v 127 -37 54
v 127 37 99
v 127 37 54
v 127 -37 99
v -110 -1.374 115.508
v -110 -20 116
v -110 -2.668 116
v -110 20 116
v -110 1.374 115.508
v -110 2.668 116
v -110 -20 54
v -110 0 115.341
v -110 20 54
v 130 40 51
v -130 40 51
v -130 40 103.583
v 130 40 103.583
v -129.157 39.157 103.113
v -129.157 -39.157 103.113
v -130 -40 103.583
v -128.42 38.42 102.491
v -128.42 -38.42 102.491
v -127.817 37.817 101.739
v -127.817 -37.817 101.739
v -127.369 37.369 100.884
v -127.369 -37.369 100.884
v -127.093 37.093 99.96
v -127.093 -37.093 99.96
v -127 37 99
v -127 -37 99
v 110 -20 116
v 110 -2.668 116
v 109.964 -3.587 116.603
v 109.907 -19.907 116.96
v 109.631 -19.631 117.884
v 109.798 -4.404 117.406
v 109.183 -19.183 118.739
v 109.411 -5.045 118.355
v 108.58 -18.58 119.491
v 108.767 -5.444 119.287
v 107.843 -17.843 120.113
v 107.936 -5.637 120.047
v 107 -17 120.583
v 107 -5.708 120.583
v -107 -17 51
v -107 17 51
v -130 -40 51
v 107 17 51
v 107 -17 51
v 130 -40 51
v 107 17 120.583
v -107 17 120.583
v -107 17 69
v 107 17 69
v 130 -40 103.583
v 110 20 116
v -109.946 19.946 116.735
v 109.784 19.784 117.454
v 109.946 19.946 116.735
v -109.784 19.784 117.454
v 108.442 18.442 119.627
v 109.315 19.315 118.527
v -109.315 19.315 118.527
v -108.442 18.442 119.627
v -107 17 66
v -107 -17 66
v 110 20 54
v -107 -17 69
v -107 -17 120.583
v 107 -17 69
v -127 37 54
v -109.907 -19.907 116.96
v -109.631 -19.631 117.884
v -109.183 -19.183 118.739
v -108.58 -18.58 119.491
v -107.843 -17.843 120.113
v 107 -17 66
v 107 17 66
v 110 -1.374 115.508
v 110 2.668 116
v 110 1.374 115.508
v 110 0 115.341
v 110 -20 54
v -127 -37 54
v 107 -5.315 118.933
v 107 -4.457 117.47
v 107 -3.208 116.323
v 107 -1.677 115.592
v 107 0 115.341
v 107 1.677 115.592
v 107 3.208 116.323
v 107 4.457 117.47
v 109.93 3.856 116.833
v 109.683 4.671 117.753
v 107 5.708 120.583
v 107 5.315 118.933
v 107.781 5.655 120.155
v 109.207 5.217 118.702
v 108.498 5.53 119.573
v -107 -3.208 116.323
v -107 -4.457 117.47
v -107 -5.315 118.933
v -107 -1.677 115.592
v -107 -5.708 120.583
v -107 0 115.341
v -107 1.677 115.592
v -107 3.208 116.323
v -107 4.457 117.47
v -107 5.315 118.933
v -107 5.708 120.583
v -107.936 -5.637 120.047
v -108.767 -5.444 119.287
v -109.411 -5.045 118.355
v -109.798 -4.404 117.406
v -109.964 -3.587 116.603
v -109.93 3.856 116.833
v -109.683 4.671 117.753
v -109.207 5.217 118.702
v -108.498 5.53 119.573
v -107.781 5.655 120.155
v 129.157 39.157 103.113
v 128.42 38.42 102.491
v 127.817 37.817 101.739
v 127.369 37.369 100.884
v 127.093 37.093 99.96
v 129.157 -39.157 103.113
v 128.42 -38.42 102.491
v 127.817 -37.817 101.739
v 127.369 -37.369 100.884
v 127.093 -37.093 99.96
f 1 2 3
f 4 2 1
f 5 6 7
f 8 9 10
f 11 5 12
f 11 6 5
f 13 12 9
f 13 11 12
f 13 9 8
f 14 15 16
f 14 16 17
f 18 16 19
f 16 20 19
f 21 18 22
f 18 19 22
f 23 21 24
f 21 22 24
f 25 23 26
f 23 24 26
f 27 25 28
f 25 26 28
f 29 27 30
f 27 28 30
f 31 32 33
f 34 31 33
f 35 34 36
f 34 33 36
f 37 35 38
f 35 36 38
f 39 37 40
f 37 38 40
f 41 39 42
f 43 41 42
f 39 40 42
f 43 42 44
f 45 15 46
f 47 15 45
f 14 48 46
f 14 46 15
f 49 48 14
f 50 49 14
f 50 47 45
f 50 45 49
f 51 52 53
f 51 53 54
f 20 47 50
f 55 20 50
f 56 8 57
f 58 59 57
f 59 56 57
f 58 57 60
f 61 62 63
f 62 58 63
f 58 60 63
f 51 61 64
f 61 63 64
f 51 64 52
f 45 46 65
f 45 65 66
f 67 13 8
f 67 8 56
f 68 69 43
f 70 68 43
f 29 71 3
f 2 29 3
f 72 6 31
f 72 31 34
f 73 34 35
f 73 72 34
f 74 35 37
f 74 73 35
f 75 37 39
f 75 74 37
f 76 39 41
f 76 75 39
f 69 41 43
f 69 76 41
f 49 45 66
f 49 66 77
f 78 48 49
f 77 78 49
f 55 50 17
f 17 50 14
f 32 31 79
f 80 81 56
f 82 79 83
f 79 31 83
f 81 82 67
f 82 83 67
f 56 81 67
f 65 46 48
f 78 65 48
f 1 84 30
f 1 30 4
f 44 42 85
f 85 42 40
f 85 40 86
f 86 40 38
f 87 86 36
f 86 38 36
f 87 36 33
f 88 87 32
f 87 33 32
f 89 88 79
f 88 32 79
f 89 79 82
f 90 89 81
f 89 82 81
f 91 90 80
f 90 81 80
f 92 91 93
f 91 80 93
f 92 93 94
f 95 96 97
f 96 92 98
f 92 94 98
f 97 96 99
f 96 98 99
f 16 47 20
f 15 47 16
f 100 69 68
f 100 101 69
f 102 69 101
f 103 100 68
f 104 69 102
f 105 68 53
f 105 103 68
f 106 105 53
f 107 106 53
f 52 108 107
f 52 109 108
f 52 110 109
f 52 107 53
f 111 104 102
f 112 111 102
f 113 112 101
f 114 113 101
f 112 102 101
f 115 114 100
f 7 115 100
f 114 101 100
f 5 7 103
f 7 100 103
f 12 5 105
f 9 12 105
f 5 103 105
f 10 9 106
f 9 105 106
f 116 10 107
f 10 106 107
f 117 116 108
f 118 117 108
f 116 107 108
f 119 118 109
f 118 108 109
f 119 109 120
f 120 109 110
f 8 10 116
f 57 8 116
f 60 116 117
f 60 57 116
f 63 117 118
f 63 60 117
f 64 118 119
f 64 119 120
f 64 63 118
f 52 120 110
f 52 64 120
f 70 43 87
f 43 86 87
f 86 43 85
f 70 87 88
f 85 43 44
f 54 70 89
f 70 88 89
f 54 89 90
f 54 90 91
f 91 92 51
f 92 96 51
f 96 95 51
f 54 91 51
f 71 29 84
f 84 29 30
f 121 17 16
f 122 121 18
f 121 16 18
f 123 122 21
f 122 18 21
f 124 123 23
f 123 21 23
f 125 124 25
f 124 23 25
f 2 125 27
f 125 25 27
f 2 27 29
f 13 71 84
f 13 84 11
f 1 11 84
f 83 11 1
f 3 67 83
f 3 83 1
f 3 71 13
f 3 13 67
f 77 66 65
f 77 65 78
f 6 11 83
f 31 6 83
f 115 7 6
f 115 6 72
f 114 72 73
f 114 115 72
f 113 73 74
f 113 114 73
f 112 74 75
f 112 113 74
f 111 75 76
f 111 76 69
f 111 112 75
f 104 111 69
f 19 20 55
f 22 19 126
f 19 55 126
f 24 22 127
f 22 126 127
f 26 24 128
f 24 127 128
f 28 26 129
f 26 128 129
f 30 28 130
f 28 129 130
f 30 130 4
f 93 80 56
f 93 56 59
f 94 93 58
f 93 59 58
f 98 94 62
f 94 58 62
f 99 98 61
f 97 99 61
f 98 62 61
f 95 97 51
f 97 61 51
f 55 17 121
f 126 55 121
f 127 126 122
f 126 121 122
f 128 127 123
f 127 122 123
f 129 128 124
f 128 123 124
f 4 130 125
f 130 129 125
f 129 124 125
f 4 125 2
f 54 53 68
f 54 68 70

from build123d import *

# Parameters (mm, degrees)
F0_W          = 260
F0_H          = 80
F1_DEPTH      = 1
F2_W          = 10
F2_H          = 10
F3_DEPTH      = 50
F4_T          = 1
F4_T3_DEPTH   = 12
F4_T5_DEPTH   = 12
F4_T7_DEPTH   = 12
F4_T9_DEPTH   = 12
F5_W          = 260
F5_H          = 80
F6_DEPTH      = 3
F7_W          = 260
F7_H          = 80
F7_W_2        = 254
F7_H_2        = 74
F8_DEPTH      = 50
F9_W          = 220
F9_H          = 40
F10_DEPTH     = 67
F11_W         = 214
F11_H         = 34
F12_DEPTH     = 52
F13_W         = 214
F13_H         = 34
F14_DEPTH     = 15
F15_T1_DEPTH  = 245
F15_T3_DEPTH  = 65
F15_T5_DEPTH  = 254
F15_T7_DEPTH  = 74
F15_T13_DEPTH = 86.5
F15_T19_DEPTH = 266.5
F15_T28_DEPTH = 86.5
F15_T34_DEPTH = 266.5
F15_T43_DEPTH = 266.5
F15_T49_DEPTH = 86.5
F15_T58_DEPTH = 86.5
F15_T64_DEPTH = 266.5
F16_R         = 5.7285158572
F17_DEPTH     = 500
F18_W         = 260
F18_H         = 80
F19_DEPTH     = 51


# Not quite as in the source:
# - a fillet or chamfer that OpenCascade refuses, or shapes differently, is made with other operations: its cross-section is extruded or revolved along the edge and cut away or added
# - a shell that OpenCascade refuses in one call is made with other operations: the cavity is built on its own and cut out


with BuildPart() as f1:
    # F0 (on Top) → F1 (new body)
    with BuildSketch(Plane.XY):
        Rectangle(F0_W, F0_H)
    extrude(amount=F1_DEPTH)

    # F2 (on face) → F3 (join)
    with BuildSketch(Plane.XY.offset(1)):
        with Locations((-125, 35)):
            Rectangle(F2_W, F2_H)
        with Locations((125, 35)):
            Rectangle(F2_W, F2_H)
        with Locations((-125, -35)):
            Rectangle(F2_W, F2_H)
        with Locations((125, -35)):
            Rectangle(F2_W, F2_H)
    extrude(amount=F3_DEPTH)

    # F4: shell of thickness 1, made by hand


with BuildPart() as f4_core1:
    # F4_t2: copy of F1
    add(f1.part)

    # the walls: a layer under each face that stays
    f4_faces = [f4_core1.faces().sort_by_distance(p)[0] for p in [
        (121.3333333333, 40, 49.3),
        (-121.3333333333, -40, 49.3),
        (125, -35, 51),
        (125, -30, 26),
        (120, -35, 26),
        (-120, -35, 26),
        (-125, -30, 26),
        (-125, -35, 51),
        (-130, 34.2857142857, 47.3571428571),
        (-125, 30, 26),
        (-125, 35, 51),
        (-120, 35, 26),
        (0, 0, 1),
        (125, 30, 26),
        (120, 35, 26),
        (125, 35, 51),
        (130, -34.2857142857, 47.3571428571),
    ]]
    thicken(f4_faces, amount=-F4_T, mode=Mode.SUBTRACT)

    # F4_s4 → F4_t3 (cut)
    with BuildSketch(Plane.YZ.offset(119)):
        Polygon((-29.99, 1.01), (-31, 1), (-31, 0), (-30, 0), align=None)
        Polygon((29.99, 1.01), (30, 0), (31, 0), (31, 1), align=None)
    extrude(amount=F4_T3_DEPTH, mode=Mode.SUBTRACT)

    # F4_s6 → F4_t5 (cut)
    with BuildSketch(Plane.XZ.offset(29)):
        Polygon((119.99, 1.01), (121, 1), (121, 0), (120, 0), align=None)
        Polygon((-119.99, 1.01), (-121, 1), (-121, 0), (-120, 0), align=None)
    extrude(amount=F4_T5_DEPTH, mode=Mode.SUBTRACT)

    # F4_s8 → F4_t7 (cut)
    with BuildSketch(Plane.YZ.offset(-131)):
        Polygon((-29.99, 1.01), (-31, 1), (-31, 0), (-30, 0), align=None)
        Polygon((29.99, 1.01), (31, 1), (31, 0), (30, 0), align=None)
    extrude(amount=F4_T7_DEPTH, mode=Mode.SUBTRACT)

    # F4_s10 → F4_t9 (cut)
    with BuildSketch(Plane.XZ.offset(-41)):
        Polygon((-119.99, 1.01), (-121, 1), (-121, 0), (-120, 0), align=None)
        Polygon((119.99, 1.01), (120, 0), (121, 0), (121, 1), align=None)
    extrude(amount=F4_T9_DEPTH, mode=Mode.SUBTRACT)


with BuildPart() as f1_1:
    add(f1.part)

    # what is left inside the walls is the cavity
    f4_cavity = [f4_core1.part.solids().sort_by_distance(p)[0] for p in [
        (125, 38.99, 33.333333),
        (-125, 38.99, 33.333333),
        (128.99, -35, 33.333333),
        (-123.666667, -31.01, 25),
    ]]
    add(f4_cavity, mode=Mode.SUBTRACT)

    # F5 (on face) → F6 (join)
    with BuildSketch(Plane.XY.offset(51)):
        Rectangle(F5_W, F5_H)
    extrude(amount=F6_DEPTH)

    # F7 (on face) → F8 (join)
    with BuildSketch(Plane.XY.offset(54)):
        Rectangle(F7_W, F7_H)
        Rectangle(F7_W_2, F7_H_2, mode=Mode.SUBTRACT)
    extrude(amount=F8_DEPTH)

    # F9 (on face) → F10 (join)
    with BuildSketch(Plane.XY.offset(54)):
        Rectangle(F9_W, F9_H)
    extrude(amount=F10_DEPTH)

    # F11 (on face) → F12 (cut)
    with BuildSketch(Plane.XY.offset(121)):
        Rectangle(F11_W, F11_H)
    extrude(amount=-F12_DEPTH, mode=Mode.SUBTRACT)

    # F13 (on face) → F14 (cut)
    with BuildSketch(Plane(origin=(0, 0, 51), x_dir=(1, 0, 0), z_dir=(0, 0, -1))):
        Rectangle(F13_W, F13_H)
    extrude(amount=-F14_DEPTH, mode=Mode.SUBTRACT)

    # F15: fillet of radius 5 on 8 edges, made by hand

    # F15_s2 → F15_t1 (cut)
    with BuildSketch(Plane.YZ.offset(-122.5)):
        with BuildLine():
            ThreePointArc((-20, 116), (-18.5355339059, 119.5355339059), (-15, 121))
            Line((-15, 121), (-20, 121))
            Line((-20, 121), (-20, 116))
        make_face()
        with BuildLine():
            ThreePointArc((20, 116), (18.5355339059, 119.5355339059), (15, 121))
            Line((15, 121), (20, 121))
            Line((20, 121), (20, 116))
        make_face()
    extrude(amount=F15_T1_DEPTH, mode=Mode.SUBTRACT)

    # F15_s4 → F15_t3 (cut)
    with BuildSketch(Plane.XZ.offset(-32.5)):
        with BuildLine():
            ThreePointArc((-110, 116), (-108.5355339059, 119.5355339059), (-105, 121))
            Line((-105, 121), (-110, 121))
            Line((-110, 121), (-110, 116))
        make_face()
        with BuildLine():
            ThreePointArc((110, 116), (108.5355339059, 119.5355339059), (105, 121))
            Line((105, 121), (110, 121))
            Line((110, 121), (110, 116))
        make_face()
    extrude(amount=F15_T3_DEPTH, mode=Mode.SUBTRACT)

    # F15_s6 → F15_t5 (cut)
    with BuildSketch(Plane.YZ.offset(-127)):
        with BuildLine():
            ThreePointArc((-42, 104), (-38.4644660941, 102.5355339059), (-37, 99))
            Line((-37, 99), (-37, 104))
            Line((-37, 104), (-42, 104))
        make_face()
        with BuildLine():
            ThreePointArc((42, 104), (38.4644660941, 102.5355339059), (37, 99))
            Line((37, 99), (37, 104))
            Line((37, 104), (42, 104))
        make_face()
    extrude(amount=F15_T5_DEPTH, mode=Mode.SUBTRACT)

    # F15_s8 → F15_t7 (cut)
    with BuildSketch(Plane.XZ.offset(-37)):
        with BuildLine():
            ThreePointArc((132, 104), (128.4644660941, 102.5355339059), (127, 99))
            Line((127, 99), (127, 104))
            Line((127, 104), (132, 104))
        make_face()
        with BuildLine():
            ThreePointArc((-132, 104), (-128.4644660941, 102.5355339059), (-127, 99))
            Line((-127, 99), (-127, 104))
            Line((-127, 104), (-132, 104))
        make_face()
    extrude(amount=F15_T7_DEPTH, mode=Mode.SUBTRACT)


with BuildPart() as f15_tool11:
    # F15_s12 → F15_t13 (new body)
    with BuildSketch(Plane.XZ.offset(-37)):
        with BuildLine():
            ThreePointArc((132, 104), (128.4644660941, 102.5355339059), (127, 99))
            Line((127, 99), (127, 104))
            Line((127, 104), (132, 104))
        make_face()
    extrude(amount=F15_T13_DEPTH)

    split(bisect_by=Plane.YZ.offset(130), keep=Keep.BOTTOM)

    split(bisect_by=Plane.XZ.offset(40), keep=Keep.BOTTOM)

    split(bisect_by=Plane.XZ.offset(37), keep=Keep.TOP)


with BuildPart() as f15_tool17:
    # F15_s18 → F15_t19 (new body)
    with BuildSketch(Plane.YZ.offset(139.5)):
        with BuildLine():
            ThreePointArc((-42, 104), (-38.4644660941, 102.5355339059), (-37, 99))
            Line((-37, 99), (-37, 104))
            Line((-37, 104), (-42, 104))
        make_face()
    extrude(amount=-F15_T19_DEPTH)

    split(bisect_by=Plane.YZ.offset(130), keep=Keep.BOTTOM)

    split(bisect_by=Plane.XZ.offset(40), keep=Keep.BOTTOM)

    split(bisect_by=Plane.YZ.offset(127), keep=Keep.TOP)


with BuildPart() as f15_tool11_1:
    add(f15_tool11.part)

    # F15_t23: intersect F15_tool17
    add(f15_tool17.part, mode=Mode.INTERSECT)


with BuildPart() as f1_2:
    add(f1_1.part)

    # F15_t9: cut F15_tool11
    add(f15_tool11_1.part, mode=Mode.SUBTRACT)


with BuildPart() as f15_tool26:
    # F15_s27 → F15_t28 (new body)
    with BuildSketch(Plane.XZ.offset(49.5)):
        with BuildLine():
            ThreePointArc((-132, 104), (-128.4644660941, 102.5355339059), (-127, 99))
            Line((-127, 99), (-127, 104))
            Line((-127, 104), (-132, 104))
        make_face()
    extrude(amount=-F15_T28_DEPTH)

    split(bisect_by=Plane.YZ.offset(-130), keep=Keep.TOP)

    split(bisect_by=Plane.XZ.offset(40), keep=Keep.BOTTOM)

    split(bisect_by=Plane.XZ.offset(37), keep=Keep.TOP)


with BuildPart() as f15_tool32:
    # F15_s33 → F15_t34 (new body)
    with BuildSketch(Plane.YZ.offset(127)):
        with BuildLine():
            ThreePointArc((-42, 104), (-38.4644660941, 102.5355339059), (-37, 99))
            Line((-37, 99), (-37, 104))
            Line((-37, 104), (-42, 104))
        make_face()
    extrude(amount=-F15_T34_DEPTH)

    split(bisect_by=Plane.YZ.offset(-130), keep=Keep.TOP)

    split(bisect_by=Plane.XZ.offset(40), keep=Keep.BOTTOM)

    split(bisect_by=Plane.YZ.offset(-127), keep=Keep.BOTTOM)


with BuildPart() as f15_tool26_1:
    add(f15_tool26.part)

    # F15_t38: intersect F15_tool32
    add(f15_tool32.part, mode=Mode.INTERSECT)


with BuildPart() as f1_3:
    add(f1_2.part)

    # F15_t24: cut F15_tool26
    add(f15_tool26_1.part, mode=Mode.SUBTRACT)


with BuildPart() as f15_tool41:
    # F15_s42 → F15_t43 (new body)
    with BuildSketch(Plane.YZ.offset(-127)):
        with BuildLine():
            ThreePointArc((42, 104), (38.4644660941, 102.5355339059), (37, 99))
            Line((37, 99), (37, 104))
            Line((37, 104), (42, 104))
        make_face()
    extrude(amount=F15_T43_DEPTH)

    split(bisect_by=Plane.XZ.offset(-40), keep=Keep.TOP)

    split(bisect_by=Plane.YZ.offset(130), keep=Keep.BOTTOM)

    split(bisect_by=Plane.YZ.offset(127), keep=Keep.TOP)


with BuildPart() as f15_tool47:
    # F15_s48 → F15_t49 (new body)
    with BuildSketch(Plane.XZ.offset(-49.5)):
        with BuildLine():
            ThreePointArc((132, 104), (128.4644660941, 102.5355339059), (127, 99))
            Line((127, 99), (127, 104))
            Line((127, 104), (132, 104))
        make_face()
    extrude(amount=F15_T49_DEPTH)

    split(bisect_by=Plane.XZ.offset(-40), keep=Keep.TOP)

    split(bisect_by=Plane.YZ.offset(130), keep=Keep.BOTTOM)

    split(bisect_by=Plane.XZ.offset(-37), keep=Keep.BOTTOM)


with BuildPart() as f15_tool41_1:
    add(f15_tool41.part)

    # F15_t53: intersect F15_tool47
    add(f15_tool47.part, mode=Mode.INTERSECT)


with BuildPart() as f1_4:
    add(f1_3.part)

    # F15_t39: cut F15_tool41
    add(f15_tool41_1.part, mode=Mode.SUBTRACT)


with BuildPart() as f15_tool56:
    # F15_s57 → F15_t58 (new body)
    with BuildSketch(Plane.XZ.offset(37)):
        with BuildLine():
            ThreePointArc((-132, 104), (-128.4644660941, 102.5355339059), (-127, 99))
            Line((-127, 99), (-127, 104))
            Line((-127, 104), (-132, 104))
        make_face()
    extrude(amount=-F15_T58_DEPTH)

    split(bisect_by=Plane.XZ.offset(-40), keep=Keep.TOP)

    split(bisect_by=Plane.YZ.offset(-130), keep=Keep.TOP)

    split(bisect_by=Plane.XZ.offset(-37), keep=Keep.BOTTOM)


with BuildPart() as f15_tool62:
    # F15_s63 → F15_t64 (new body)
    with BuildSketch(Plane.YZ.offset(-139.5)):
        with BuildLine():
            ThreePointArc((42, 104), (38.4644660941, 102.5355339059), (37, 99))
            Line((37, 99), (37, 104))
            Line((37, 104), (42, 104))
        make_face()
    extrude(amount=F15_T64_DEPTH)

    split(bisect_by=Plane.XZ.offset(-40), keep=Keep.TOP)

    split(bisect_by=Plane.YZ.offset(-130), keep=Keep.TOP)

    split(bisect_by=Plane.YZ.offset(-127), keep=Keep.BOTTOM)


with BuildPart() as f15_tool56_1:
    add(f15_tool56.part)

    # F15_t68: intersect F15_tool62
    add(f15_tool62.part, mode=Mode.INTERSECT)


with BuildPart() as f1_5:
    add(f1_4.part)

    # F15_t54: cut F15_tool56
    add(f15_tool56_1.part, mode=Mode.SUBTRACT)

    # F16 (on face) → F17 (cut)
    with BuildSketch(Plane.YZ.offset(110)):
        with Locations((0, 121.0692673922)):
            Circle(F16_R)
    extrude(amount=-F17_DEPTH, mode=Mode.SUBTRACT)

    # F18 (on face) → F19 (cut)
    with BuildSketch(Plane(origin=(0, 0, 0), x_dir=(1, 0, 0), z_dir=(0, 0, -1))):
        Rectangle(F18_W, F18_H)
    extrude(amount=-F19_DEPTH, mode=Mode.SUBTRACT)


solid = f1_5.part
